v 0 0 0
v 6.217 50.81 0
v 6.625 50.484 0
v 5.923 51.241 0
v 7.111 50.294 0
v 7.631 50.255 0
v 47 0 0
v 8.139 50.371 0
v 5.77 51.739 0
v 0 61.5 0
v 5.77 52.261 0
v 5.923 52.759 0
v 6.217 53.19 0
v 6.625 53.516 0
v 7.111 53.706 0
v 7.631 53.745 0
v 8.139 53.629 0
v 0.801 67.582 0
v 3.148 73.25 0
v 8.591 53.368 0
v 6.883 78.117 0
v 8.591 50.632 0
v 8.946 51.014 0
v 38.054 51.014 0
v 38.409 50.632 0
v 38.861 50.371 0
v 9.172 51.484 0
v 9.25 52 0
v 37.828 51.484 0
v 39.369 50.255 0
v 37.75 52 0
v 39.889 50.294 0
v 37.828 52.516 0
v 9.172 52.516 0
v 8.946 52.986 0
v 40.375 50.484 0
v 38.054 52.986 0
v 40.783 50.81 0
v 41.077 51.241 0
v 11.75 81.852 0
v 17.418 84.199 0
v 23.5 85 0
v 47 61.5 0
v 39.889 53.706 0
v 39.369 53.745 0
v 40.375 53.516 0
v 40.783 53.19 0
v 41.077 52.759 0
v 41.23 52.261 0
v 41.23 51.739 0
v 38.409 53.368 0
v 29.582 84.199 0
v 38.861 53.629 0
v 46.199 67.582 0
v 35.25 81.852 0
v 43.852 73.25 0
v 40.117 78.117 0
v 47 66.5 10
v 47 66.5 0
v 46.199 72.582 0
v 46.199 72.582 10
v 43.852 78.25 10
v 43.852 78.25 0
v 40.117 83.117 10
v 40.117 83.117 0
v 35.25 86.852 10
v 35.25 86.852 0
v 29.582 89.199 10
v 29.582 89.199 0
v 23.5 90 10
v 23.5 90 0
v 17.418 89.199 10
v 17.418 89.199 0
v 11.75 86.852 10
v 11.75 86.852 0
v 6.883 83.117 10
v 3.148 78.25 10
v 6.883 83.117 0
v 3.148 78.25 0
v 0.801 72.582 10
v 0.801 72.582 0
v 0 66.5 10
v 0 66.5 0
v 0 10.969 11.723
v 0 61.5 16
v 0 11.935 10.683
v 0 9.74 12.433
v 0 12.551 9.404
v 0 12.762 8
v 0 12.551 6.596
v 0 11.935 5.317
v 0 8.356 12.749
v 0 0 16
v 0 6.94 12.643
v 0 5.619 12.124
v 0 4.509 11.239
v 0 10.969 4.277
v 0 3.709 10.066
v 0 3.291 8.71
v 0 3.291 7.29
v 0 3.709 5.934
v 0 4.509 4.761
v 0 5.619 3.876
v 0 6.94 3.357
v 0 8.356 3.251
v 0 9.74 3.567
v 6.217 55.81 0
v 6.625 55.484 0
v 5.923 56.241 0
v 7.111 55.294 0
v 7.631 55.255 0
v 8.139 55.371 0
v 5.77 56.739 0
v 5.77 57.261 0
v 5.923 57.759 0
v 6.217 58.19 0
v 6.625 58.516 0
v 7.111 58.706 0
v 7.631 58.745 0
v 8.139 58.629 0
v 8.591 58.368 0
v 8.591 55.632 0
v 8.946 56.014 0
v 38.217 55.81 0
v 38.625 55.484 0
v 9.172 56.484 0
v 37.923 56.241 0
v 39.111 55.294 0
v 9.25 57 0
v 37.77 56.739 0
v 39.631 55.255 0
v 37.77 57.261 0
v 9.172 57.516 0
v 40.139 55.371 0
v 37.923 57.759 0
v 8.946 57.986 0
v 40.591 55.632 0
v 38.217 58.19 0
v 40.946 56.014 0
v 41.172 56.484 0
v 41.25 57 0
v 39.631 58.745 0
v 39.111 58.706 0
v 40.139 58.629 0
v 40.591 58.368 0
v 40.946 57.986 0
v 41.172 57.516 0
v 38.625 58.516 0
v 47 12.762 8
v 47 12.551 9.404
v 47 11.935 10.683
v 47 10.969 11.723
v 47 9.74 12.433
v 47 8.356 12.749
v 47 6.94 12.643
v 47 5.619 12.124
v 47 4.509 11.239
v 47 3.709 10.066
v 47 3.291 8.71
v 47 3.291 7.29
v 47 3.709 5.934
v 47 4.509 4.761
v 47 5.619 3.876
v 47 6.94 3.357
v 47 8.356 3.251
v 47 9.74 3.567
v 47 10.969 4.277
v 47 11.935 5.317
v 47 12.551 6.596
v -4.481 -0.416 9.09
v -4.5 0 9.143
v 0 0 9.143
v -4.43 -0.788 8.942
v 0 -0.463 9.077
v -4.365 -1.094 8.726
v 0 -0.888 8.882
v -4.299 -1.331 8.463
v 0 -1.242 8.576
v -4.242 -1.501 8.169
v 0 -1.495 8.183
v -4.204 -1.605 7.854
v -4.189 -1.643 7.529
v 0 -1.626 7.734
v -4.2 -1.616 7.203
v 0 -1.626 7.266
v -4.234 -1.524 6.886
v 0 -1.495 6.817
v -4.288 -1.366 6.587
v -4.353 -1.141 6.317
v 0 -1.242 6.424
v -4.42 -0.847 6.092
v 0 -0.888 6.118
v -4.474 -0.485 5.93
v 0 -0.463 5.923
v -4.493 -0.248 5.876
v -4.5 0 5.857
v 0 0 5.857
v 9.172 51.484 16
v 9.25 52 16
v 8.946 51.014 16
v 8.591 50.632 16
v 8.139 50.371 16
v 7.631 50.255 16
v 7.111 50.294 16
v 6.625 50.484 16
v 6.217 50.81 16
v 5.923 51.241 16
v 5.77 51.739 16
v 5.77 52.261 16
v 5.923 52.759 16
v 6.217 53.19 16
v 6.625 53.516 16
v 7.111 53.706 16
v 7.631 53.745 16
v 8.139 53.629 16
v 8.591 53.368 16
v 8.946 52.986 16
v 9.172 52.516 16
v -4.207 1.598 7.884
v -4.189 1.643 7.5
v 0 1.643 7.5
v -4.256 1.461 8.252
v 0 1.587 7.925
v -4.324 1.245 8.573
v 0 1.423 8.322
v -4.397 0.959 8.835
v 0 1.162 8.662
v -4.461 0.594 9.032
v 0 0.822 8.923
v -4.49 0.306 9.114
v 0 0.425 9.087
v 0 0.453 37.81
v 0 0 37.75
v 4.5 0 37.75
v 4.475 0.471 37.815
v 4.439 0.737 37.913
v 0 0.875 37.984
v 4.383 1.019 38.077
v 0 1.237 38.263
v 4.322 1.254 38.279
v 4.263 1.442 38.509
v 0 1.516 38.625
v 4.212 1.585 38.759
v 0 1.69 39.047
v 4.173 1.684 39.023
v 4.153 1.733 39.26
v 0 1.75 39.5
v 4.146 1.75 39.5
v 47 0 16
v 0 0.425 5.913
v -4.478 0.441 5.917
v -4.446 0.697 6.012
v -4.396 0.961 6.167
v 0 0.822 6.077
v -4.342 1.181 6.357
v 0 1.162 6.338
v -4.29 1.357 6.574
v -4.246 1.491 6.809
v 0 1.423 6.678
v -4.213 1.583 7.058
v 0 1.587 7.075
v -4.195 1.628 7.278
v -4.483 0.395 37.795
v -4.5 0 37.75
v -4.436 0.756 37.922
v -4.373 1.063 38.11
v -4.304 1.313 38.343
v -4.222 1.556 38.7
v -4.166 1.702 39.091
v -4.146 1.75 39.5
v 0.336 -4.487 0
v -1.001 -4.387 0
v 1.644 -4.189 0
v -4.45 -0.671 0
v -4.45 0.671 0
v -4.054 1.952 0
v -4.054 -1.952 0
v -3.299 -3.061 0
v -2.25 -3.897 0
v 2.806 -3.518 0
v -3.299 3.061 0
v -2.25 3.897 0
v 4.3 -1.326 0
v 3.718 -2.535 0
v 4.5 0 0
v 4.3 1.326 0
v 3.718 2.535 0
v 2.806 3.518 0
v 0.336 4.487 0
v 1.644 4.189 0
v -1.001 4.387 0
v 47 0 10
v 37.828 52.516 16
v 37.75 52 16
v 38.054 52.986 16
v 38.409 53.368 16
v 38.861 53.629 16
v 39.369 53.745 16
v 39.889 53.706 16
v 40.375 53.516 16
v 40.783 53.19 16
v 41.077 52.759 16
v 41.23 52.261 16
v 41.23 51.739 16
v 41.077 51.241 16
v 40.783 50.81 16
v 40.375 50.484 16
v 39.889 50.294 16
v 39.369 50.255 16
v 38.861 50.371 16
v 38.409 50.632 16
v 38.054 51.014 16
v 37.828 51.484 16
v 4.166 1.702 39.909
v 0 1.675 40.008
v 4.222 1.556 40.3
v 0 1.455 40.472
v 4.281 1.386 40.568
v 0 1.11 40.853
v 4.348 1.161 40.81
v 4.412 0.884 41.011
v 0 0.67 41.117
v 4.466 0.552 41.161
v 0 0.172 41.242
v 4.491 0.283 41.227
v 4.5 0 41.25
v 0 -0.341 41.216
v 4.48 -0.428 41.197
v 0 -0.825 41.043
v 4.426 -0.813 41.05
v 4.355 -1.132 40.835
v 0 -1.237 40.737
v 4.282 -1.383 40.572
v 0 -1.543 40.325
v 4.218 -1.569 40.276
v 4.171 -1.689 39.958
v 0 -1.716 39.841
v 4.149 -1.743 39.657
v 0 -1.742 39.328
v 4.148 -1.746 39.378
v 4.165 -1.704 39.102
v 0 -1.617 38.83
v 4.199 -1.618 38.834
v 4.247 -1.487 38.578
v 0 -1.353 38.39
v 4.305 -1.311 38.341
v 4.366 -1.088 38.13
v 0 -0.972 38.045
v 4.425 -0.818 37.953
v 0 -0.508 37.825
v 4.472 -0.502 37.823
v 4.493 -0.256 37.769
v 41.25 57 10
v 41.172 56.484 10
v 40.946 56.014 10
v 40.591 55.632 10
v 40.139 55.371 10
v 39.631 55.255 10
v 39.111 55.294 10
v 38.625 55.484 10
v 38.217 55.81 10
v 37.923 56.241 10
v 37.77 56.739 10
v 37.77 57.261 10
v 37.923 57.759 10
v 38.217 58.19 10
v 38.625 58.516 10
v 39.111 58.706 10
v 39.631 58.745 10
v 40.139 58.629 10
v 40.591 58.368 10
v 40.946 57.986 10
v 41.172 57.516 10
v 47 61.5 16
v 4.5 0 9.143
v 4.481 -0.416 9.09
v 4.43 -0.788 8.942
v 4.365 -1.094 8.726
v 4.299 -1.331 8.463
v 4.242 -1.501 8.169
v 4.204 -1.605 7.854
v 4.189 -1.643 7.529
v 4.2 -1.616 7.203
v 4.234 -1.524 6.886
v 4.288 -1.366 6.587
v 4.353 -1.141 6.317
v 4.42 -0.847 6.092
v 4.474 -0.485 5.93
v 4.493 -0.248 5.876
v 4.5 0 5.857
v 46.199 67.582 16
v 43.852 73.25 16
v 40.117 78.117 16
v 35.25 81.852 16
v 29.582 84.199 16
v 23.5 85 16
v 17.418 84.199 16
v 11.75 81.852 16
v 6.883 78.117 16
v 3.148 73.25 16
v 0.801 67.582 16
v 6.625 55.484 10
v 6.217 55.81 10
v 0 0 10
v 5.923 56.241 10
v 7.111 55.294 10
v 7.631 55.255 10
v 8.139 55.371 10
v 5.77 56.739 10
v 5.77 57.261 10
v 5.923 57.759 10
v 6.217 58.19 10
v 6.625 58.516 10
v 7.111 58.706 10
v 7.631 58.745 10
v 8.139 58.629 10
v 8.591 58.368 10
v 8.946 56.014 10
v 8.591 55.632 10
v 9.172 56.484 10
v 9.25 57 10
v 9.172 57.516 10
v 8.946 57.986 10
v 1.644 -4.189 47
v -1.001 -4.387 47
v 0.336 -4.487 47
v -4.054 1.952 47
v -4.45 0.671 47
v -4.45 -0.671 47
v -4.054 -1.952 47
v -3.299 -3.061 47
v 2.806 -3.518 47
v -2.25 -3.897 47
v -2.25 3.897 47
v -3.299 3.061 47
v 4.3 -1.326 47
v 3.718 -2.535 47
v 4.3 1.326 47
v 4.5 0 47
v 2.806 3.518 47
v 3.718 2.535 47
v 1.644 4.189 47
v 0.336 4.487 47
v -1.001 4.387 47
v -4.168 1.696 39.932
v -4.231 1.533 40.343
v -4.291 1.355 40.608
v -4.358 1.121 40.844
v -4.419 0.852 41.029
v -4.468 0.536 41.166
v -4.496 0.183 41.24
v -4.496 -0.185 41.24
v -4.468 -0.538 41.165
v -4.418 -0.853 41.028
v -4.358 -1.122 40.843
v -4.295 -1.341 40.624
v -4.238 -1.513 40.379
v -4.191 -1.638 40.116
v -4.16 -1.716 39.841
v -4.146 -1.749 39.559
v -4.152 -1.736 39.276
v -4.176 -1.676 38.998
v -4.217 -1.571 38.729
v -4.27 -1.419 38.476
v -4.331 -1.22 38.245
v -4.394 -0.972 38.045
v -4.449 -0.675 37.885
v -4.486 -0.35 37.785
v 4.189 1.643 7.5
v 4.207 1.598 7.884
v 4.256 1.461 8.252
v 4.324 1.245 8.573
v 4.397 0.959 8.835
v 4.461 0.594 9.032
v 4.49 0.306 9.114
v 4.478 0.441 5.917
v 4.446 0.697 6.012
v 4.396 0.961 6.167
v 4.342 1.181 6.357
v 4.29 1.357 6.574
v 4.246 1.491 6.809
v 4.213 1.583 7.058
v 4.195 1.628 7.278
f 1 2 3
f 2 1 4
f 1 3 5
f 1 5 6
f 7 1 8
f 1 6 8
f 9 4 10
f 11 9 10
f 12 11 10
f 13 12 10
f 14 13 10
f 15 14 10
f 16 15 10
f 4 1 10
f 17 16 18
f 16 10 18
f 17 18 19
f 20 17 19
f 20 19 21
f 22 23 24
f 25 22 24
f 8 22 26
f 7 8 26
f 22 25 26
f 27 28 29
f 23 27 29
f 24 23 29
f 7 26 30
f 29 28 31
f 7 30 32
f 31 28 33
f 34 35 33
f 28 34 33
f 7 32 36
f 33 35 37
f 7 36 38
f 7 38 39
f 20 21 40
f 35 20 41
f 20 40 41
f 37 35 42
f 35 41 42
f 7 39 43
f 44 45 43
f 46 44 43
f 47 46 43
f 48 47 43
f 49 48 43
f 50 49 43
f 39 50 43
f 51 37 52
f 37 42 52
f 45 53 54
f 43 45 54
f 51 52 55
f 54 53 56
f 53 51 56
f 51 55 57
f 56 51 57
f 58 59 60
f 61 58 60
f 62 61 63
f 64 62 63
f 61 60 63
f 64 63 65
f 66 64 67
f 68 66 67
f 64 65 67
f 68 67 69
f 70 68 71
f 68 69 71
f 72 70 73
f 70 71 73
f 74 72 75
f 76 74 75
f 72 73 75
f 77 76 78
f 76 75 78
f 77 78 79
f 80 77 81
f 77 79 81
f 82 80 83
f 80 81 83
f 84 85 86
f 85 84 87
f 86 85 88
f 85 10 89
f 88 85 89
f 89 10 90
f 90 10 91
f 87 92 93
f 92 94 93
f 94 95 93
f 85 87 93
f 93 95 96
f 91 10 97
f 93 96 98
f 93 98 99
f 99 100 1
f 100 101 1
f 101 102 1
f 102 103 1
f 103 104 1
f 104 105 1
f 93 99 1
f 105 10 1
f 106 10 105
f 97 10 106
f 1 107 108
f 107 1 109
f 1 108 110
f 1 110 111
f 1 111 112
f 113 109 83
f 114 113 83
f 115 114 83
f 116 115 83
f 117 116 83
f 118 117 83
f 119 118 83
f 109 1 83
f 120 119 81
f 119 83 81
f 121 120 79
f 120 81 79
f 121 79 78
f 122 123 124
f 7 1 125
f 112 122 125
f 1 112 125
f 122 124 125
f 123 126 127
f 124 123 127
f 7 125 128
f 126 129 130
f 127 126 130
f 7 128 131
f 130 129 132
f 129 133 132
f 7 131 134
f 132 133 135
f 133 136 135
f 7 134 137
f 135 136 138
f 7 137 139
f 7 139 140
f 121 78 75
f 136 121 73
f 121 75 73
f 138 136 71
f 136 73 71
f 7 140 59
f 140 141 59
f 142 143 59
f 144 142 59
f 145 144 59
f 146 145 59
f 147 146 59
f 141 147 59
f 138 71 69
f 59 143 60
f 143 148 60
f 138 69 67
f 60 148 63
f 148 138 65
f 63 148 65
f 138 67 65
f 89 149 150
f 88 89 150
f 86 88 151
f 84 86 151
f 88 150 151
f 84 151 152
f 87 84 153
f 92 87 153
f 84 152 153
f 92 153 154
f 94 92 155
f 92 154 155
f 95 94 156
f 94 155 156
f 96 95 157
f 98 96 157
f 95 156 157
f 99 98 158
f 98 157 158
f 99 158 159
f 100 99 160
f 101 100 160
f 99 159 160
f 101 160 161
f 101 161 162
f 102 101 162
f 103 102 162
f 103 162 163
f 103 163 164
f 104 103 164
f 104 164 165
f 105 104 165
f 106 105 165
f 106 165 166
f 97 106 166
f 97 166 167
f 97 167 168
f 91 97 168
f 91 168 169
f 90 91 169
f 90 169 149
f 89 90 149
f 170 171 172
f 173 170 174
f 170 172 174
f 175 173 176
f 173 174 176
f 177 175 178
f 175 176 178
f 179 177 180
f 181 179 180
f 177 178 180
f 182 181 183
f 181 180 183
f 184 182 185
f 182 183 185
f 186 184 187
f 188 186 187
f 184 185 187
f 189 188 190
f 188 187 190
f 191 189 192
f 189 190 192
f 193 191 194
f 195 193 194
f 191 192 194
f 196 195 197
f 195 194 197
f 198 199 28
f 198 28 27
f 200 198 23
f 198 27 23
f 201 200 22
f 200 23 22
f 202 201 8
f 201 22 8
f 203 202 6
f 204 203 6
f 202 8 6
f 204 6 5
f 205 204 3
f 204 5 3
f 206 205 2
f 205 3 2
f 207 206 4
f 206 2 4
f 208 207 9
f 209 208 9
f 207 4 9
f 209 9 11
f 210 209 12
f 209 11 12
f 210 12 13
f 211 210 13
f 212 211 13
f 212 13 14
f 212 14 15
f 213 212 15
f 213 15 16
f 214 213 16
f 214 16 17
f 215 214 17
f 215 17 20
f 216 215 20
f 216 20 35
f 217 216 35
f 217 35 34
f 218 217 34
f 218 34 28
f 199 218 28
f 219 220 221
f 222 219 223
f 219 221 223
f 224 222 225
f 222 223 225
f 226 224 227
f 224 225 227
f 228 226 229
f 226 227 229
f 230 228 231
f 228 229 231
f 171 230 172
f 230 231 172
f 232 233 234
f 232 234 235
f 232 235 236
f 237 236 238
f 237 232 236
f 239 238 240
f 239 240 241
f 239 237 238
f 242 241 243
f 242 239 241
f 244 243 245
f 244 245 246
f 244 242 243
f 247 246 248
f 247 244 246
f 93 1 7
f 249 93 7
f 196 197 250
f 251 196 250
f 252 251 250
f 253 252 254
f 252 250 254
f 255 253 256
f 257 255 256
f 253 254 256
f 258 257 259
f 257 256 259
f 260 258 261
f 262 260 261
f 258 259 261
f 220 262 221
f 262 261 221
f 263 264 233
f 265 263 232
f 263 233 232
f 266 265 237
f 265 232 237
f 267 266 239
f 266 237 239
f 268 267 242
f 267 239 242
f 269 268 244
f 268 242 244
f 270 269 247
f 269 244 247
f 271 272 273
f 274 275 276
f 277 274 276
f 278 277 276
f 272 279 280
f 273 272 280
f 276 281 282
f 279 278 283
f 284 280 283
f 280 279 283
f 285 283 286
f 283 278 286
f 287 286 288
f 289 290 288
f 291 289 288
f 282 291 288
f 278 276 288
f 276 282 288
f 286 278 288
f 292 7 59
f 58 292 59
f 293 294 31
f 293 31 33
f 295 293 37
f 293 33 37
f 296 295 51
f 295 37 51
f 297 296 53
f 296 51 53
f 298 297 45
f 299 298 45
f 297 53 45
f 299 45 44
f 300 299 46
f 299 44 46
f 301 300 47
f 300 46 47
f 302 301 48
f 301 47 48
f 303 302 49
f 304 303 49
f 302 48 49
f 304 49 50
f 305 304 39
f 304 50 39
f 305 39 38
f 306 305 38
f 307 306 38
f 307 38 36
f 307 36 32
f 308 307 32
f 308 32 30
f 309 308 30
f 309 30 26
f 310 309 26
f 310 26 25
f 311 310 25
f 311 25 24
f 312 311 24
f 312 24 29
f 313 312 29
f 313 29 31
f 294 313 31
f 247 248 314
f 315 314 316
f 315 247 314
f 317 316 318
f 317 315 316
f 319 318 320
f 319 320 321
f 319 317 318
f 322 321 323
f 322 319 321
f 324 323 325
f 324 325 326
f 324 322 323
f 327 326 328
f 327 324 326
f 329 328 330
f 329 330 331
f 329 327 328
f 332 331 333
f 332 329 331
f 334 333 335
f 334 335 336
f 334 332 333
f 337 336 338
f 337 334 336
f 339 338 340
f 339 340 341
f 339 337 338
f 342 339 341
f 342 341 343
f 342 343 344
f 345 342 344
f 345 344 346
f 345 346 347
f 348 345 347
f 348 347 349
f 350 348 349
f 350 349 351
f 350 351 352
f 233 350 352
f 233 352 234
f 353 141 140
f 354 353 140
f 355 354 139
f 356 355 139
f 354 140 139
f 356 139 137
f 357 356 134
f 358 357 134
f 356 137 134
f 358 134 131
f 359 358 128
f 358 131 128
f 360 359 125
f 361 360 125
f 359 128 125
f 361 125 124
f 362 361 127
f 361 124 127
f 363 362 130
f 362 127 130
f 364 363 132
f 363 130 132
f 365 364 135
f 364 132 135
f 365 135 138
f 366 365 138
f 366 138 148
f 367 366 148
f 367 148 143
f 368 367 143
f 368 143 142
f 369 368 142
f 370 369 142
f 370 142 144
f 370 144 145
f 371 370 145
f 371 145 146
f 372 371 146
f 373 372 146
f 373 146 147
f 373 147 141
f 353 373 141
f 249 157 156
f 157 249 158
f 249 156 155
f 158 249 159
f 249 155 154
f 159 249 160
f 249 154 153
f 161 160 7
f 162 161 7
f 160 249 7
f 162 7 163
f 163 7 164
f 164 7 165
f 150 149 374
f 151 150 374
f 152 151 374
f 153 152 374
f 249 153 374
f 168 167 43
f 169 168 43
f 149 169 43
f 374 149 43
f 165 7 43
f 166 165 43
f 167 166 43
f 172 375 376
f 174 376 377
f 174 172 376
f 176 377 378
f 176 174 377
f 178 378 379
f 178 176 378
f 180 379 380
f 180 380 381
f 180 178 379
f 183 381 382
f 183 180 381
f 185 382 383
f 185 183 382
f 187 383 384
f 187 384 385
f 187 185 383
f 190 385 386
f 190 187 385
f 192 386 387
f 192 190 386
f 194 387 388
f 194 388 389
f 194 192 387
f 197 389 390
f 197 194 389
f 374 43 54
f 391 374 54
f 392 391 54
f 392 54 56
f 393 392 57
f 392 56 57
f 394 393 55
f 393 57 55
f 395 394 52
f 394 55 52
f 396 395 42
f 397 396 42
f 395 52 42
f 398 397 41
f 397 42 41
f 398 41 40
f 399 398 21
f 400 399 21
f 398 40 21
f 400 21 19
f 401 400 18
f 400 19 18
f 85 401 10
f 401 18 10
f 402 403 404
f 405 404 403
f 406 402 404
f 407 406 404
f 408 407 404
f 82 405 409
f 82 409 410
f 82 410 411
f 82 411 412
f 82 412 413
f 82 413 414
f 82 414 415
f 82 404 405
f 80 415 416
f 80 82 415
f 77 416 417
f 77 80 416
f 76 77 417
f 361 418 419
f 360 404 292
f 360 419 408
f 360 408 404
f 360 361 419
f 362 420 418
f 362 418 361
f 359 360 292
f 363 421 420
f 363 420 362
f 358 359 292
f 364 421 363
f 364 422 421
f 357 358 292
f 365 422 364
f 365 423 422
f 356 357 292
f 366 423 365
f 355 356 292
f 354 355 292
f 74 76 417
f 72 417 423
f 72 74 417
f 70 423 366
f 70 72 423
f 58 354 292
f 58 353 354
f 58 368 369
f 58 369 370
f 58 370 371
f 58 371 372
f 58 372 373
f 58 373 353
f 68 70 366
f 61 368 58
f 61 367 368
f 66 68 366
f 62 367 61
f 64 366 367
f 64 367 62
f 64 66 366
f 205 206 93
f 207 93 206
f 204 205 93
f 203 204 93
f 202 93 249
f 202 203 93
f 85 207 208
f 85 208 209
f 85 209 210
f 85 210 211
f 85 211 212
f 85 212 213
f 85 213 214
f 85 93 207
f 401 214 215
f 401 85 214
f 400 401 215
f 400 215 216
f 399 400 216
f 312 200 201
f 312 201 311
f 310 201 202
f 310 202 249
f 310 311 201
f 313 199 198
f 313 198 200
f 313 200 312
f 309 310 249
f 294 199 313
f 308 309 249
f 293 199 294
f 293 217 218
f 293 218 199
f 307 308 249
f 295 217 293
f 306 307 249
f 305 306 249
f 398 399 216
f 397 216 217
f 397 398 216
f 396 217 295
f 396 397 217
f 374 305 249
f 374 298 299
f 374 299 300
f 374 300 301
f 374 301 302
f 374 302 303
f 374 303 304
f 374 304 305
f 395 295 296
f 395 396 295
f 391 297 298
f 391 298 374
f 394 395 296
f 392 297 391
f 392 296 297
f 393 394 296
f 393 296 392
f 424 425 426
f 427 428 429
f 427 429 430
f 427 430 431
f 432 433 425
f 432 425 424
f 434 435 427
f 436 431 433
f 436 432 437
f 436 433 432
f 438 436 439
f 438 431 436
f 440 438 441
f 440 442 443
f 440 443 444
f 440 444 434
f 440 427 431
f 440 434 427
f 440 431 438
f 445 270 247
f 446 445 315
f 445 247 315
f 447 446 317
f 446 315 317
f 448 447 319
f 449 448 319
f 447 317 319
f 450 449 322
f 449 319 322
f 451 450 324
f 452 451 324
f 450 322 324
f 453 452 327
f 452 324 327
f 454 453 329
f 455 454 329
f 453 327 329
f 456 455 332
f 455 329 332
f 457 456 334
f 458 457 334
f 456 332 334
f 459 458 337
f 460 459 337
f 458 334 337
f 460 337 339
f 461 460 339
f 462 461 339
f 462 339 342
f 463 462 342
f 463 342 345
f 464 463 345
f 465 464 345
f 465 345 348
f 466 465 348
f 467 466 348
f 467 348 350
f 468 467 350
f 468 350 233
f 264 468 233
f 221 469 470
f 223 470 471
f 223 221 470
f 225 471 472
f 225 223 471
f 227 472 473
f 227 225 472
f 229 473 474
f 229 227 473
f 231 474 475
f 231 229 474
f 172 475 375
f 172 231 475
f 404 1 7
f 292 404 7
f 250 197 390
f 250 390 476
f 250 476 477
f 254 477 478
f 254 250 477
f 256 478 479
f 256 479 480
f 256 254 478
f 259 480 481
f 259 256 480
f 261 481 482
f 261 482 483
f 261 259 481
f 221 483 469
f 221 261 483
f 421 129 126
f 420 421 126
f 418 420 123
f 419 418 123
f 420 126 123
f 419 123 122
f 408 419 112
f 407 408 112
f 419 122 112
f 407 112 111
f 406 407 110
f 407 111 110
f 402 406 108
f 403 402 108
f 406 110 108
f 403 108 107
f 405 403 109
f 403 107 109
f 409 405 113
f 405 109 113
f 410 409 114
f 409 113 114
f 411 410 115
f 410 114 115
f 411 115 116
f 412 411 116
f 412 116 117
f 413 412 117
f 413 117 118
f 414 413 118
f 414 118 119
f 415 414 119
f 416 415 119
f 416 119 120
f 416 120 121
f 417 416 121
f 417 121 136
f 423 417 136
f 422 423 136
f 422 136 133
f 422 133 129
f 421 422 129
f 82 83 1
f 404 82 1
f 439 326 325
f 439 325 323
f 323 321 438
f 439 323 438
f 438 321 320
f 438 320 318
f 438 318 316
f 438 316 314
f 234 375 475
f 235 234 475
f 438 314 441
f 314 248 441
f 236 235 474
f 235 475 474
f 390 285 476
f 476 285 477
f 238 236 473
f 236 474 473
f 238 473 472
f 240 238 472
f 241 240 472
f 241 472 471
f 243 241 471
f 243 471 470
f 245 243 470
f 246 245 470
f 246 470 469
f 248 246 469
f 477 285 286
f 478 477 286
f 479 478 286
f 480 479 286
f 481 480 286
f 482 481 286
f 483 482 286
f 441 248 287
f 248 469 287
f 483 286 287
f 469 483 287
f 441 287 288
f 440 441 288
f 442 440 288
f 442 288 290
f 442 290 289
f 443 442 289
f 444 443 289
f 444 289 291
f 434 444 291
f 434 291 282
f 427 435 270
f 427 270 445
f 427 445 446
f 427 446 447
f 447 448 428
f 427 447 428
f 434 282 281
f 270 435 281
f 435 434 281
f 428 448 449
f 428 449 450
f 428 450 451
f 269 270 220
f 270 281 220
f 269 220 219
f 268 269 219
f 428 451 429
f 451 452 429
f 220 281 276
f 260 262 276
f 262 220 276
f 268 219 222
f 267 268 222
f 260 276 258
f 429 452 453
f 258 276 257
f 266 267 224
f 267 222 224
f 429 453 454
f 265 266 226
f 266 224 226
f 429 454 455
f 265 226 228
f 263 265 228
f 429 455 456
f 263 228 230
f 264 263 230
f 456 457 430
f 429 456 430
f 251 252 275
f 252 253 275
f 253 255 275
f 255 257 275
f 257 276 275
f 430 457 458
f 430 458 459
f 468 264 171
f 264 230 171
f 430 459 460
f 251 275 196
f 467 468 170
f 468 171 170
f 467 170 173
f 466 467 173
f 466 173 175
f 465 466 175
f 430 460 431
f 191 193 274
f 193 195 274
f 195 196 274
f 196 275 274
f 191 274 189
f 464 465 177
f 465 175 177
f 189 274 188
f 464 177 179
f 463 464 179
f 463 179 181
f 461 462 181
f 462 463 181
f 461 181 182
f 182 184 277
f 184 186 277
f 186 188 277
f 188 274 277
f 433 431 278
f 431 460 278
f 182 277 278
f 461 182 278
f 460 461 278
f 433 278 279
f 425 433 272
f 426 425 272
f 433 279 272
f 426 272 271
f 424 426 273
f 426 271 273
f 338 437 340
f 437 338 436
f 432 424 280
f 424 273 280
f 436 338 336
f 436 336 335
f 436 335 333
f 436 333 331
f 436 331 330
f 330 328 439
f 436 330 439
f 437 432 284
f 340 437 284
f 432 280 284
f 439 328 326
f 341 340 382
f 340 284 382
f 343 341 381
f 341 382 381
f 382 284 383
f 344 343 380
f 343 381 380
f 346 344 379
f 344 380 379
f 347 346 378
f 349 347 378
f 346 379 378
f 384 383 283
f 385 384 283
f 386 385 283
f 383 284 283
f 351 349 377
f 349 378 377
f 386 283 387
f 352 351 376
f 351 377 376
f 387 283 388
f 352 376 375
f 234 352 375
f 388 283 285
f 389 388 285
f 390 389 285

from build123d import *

# Parameters (mm, degrees)
F1_DEPTH  = 10
F2_R      = 1.75
F3_DEPTH  = 25
F7_DEPTH  = 16
F8_R      = 1.75
F9_DEPTH  = 25
F10_R     = 4.5
F11_DEPTH = 47
F13_DEPTH = 12.5
F14_R     = 4.7625
F15_DEPTH = 51.5010001


with BuildPart() as f1:
    # F0 (on Top) → F1 (new body)
    with BuildSketch(Plane.XY):
        with BuildLine():
            Line((0, 66.5), (0, 0))
            Line((0, 0), (47, 0))
            Line((47, 0), (47, 66.5))
            ThreePointArc((47, 66.5), (23.5, 90), (0, 66.5))
        make_face()
    extrude(amount=F1_DEPTH)

    # F2 (on face) → F3 (cut)
    with BuildSketch(Plane(origin=(0, 0, 0), x_dir=(1, 0, 0), z_dir=(0, 0, -1))):
        with Locations((39.5, -57)):
            Circle(F2_R)
        with Locations((7.5, -57)):
            Circle(F2_R)
    extrude(amount=-F3_DEPTH, mode=Mode.SUBTRACT)


with BuildPart() as f4_1:
    # F4: copy of F1
    add(f1.part.moved(Location((0, 0, 33))))


with BuildPart() as f7:
    # F6 (on Top) → F7 (new body)
    with BuildSketch(Plane.XY):
        with BuildLine():
            Line((0, 61.5), (0, 0))
            Line((0, 0), (47, 0))
            Line((47, 0), (47, 61.5))
            ThreePointArc((47, 61.5), (23.5, 85), (0, 61.5))
        make_face()
    extrude(amount=F7_DEPTH)

    # F8 (on face) → F9 (cut)
    with BuildSketch(Plane(origin=(0, 0, 0), x_dir=(1, 0, 0), z_dir=(0, 0, -1))):
        with Locations((7.5, -52)):
            Circle(F8_R)
        with BuildLine():
            ThreePointArc((41.25, -52), (39.5, -50.25), (37.75, -52))
            ThreePointArc((37.75, -52), (39.5, -53.75), (41.25, -52))
        make_face()
    extrude(amount=-F9_DEPTH, mode=Mode.SUBTRACT)

    # F14 (on face) → F15 (cut, through all)
    with BuildSketch(Plane.YZ.offset(47)):
        with Locations((8, 8)):
            Circle(F14_R)
    extrude(amount=-F15_DEPTH, mode=Mode.SUBTRACT)


with BuildPart() as f11:
    # F10 (on Top) → F11 (new body)
    with BuildSketch(Plane.XY):
        Circle(F10_R)
    extrude(amount=F11_DEPTH)

    # F12 (on Right) → F13 (cut, symmetric)
    with BuildSketch(Plane.YZ):
        with BuildLine():
            ThreePointArc((0, 9.1430840102), (-1.6430840102, 7.5), (0, 5.8569159898))
            Line((0, 5.8569159898), (0, 9.1430840102))
        make_face()
        with BuildLine():
            ThreePointArc((1.75, 39.5), (-1.2374368671, 40.7374368671), (0, 37.75))
            ThreePointArc((0, 37.75), (1.2374368671, 38.2625631329), (1.75, 39.5))
        make_face()
        with BuildLine():
            Line((0, 9.1430840102), (0, 5.8569159898))
            ThreePointArc((0, 5.8569159898), (1.1618358457, 6.3381641543), (1.6430840102, 7.5))
            ThreePointArc((1.6430840102, 7.5), (1.1618358457, 8.6618358457), (0, 9.1430840102))
        make_face()
    extrude(amount=F13_DEPTH, both=True, mode=Mode.SUBTRACT)


solid = Compound([f1.part, f7.part, f11.part])
